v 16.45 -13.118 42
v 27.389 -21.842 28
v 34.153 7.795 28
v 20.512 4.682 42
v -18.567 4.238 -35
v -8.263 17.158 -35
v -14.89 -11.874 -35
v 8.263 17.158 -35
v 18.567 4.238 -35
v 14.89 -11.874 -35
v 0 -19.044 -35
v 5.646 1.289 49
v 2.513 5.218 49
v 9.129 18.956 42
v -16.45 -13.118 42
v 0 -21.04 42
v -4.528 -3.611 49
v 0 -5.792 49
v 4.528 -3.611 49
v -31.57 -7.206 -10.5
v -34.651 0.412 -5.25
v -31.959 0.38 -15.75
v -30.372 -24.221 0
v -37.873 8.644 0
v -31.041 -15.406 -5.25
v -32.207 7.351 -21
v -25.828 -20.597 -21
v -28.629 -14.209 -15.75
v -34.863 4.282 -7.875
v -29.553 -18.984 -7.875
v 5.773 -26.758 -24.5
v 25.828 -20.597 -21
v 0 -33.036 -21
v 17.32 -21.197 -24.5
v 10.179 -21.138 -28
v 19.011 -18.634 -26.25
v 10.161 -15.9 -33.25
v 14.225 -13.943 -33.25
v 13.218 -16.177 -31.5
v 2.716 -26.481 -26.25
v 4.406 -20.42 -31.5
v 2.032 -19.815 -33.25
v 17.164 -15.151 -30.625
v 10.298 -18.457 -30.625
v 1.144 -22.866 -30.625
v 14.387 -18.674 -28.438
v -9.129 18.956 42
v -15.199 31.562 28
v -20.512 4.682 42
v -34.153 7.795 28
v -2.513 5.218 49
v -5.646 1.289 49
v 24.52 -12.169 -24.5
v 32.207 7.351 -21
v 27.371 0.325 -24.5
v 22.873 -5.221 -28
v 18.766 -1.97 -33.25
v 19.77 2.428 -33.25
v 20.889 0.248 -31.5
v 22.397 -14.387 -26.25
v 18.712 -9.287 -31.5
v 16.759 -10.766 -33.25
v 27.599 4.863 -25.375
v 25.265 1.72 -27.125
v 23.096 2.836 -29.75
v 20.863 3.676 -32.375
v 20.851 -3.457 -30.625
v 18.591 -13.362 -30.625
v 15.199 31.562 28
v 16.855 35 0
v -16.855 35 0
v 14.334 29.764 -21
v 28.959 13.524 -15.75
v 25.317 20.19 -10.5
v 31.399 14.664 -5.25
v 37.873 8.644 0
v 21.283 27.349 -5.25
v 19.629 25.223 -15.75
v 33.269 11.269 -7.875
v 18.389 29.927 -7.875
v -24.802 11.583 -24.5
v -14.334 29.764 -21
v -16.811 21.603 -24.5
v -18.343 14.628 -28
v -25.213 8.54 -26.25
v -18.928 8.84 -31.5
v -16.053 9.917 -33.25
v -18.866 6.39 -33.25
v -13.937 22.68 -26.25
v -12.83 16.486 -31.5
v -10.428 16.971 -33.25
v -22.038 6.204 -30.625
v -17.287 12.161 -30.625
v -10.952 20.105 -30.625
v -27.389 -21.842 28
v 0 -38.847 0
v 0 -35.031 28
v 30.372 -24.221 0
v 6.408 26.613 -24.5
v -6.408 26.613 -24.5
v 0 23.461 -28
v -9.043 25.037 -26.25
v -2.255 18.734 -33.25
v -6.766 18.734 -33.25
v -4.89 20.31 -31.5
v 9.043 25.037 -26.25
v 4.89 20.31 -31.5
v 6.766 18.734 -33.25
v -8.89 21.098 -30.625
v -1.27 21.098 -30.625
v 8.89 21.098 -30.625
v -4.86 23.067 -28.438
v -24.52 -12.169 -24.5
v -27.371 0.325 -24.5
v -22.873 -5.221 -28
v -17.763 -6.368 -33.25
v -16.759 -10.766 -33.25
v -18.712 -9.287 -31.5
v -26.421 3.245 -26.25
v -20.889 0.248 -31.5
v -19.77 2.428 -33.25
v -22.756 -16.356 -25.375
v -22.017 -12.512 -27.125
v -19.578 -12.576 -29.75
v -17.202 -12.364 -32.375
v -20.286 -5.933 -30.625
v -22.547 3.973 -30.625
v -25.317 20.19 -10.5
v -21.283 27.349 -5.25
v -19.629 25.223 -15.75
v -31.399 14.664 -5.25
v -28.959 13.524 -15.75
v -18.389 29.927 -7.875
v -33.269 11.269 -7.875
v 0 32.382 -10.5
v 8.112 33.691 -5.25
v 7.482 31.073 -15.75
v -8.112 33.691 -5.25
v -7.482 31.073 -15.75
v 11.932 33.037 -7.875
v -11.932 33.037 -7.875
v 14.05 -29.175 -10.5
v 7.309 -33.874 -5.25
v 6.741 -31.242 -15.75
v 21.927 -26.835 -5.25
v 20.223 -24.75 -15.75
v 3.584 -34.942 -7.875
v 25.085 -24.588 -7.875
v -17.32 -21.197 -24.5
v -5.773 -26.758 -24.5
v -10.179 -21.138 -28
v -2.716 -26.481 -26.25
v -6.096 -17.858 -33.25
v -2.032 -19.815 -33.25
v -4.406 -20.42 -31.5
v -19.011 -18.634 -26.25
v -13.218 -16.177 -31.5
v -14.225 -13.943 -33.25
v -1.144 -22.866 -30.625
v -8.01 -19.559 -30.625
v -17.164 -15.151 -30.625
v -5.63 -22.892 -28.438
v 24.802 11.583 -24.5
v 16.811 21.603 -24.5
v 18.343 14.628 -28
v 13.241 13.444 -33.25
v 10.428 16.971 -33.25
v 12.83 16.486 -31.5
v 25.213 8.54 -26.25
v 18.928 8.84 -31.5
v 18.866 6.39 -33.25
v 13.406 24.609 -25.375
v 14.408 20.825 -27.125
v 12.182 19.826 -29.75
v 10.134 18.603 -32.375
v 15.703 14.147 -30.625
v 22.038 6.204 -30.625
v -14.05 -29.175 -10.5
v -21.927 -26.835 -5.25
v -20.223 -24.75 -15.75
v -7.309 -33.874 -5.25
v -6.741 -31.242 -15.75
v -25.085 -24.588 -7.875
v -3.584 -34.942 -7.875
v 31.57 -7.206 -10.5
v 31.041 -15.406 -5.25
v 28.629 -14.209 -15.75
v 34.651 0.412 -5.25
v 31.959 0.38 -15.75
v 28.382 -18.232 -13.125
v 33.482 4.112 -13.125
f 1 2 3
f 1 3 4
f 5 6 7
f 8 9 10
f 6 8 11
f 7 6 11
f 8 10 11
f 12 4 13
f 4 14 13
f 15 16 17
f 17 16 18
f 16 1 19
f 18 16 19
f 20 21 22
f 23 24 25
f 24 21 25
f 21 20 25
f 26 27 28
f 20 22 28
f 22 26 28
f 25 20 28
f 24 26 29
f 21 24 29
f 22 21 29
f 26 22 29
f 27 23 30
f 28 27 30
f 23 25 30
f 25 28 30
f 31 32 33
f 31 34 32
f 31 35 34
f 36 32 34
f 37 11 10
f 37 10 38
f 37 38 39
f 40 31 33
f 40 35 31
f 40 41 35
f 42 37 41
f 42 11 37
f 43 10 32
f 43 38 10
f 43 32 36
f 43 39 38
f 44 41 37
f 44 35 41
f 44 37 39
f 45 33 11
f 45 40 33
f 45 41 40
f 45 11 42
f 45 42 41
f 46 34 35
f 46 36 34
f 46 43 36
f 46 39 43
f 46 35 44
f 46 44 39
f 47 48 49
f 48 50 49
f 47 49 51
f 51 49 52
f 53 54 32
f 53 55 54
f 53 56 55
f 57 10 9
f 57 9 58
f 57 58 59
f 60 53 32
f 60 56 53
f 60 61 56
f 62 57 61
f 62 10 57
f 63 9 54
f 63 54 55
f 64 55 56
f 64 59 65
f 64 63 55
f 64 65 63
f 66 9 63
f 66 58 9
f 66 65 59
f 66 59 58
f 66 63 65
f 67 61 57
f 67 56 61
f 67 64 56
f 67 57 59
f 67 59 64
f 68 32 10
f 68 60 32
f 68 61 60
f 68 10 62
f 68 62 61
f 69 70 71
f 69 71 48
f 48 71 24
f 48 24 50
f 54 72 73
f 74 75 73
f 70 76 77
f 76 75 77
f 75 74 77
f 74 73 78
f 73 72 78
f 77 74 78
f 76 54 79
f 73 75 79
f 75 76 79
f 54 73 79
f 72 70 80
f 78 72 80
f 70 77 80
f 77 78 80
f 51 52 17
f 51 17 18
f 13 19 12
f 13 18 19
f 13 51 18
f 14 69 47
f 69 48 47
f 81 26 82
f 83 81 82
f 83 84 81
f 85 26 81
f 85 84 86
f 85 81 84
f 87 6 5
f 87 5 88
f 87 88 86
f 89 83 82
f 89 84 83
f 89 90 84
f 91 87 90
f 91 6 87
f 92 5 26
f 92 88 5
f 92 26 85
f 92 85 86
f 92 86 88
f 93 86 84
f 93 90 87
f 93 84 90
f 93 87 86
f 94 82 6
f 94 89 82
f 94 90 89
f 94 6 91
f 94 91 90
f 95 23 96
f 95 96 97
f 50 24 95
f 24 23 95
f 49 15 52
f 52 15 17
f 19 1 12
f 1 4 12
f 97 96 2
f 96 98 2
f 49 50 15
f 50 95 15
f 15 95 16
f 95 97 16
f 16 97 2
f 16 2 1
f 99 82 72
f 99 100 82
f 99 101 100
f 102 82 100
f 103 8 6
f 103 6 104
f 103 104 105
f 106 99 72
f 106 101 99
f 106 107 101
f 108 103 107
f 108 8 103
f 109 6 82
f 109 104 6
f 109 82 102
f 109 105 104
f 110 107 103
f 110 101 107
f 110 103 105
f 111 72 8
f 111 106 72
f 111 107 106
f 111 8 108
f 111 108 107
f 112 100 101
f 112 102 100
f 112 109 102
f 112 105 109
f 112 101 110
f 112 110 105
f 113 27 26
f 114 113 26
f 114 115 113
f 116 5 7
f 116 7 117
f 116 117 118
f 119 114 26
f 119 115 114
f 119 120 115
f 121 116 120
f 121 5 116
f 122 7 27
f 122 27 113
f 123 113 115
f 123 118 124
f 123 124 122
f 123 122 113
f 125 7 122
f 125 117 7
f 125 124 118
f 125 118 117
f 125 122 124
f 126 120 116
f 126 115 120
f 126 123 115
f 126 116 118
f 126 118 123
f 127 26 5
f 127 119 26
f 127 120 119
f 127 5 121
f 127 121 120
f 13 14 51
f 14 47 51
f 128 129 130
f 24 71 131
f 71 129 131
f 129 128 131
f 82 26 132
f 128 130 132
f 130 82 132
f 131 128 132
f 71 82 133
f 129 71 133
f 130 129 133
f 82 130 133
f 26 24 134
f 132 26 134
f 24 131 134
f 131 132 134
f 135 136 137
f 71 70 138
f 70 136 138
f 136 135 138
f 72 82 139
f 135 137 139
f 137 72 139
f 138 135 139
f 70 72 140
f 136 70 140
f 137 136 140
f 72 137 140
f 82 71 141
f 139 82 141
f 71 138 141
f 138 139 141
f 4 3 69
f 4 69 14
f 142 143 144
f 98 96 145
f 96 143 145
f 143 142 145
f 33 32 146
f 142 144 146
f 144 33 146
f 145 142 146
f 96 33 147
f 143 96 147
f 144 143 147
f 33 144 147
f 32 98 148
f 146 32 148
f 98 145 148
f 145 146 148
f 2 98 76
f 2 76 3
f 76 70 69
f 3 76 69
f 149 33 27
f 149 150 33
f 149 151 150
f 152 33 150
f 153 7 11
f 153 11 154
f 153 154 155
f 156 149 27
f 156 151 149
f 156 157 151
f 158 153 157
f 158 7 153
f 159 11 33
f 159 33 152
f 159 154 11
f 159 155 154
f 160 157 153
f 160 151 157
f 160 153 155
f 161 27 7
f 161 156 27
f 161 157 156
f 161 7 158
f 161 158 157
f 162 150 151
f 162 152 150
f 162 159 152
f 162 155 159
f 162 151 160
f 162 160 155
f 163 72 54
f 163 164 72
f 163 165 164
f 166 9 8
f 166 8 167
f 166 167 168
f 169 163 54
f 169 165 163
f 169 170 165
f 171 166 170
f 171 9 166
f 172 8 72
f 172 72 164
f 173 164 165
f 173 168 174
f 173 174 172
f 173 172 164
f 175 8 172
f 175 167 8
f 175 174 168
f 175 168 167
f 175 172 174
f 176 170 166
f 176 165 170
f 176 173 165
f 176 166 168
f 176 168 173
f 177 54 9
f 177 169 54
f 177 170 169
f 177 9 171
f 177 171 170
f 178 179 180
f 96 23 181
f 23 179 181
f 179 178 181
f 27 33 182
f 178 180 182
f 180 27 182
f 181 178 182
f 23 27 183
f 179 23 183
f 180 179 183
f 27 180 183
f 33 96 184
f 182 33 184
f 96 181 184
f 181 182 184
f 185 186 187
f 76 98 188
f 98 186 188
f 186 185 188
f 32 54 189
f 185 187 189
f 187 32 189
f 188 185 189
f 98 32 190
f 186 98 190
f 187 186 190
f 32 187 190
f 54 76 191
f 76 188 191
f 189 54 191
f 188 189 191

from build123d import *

# Parameters (mm, degrees)
F1_DEPTH = 28
F1_TAPER = 7
F2_DEPTH = 14
F2_TAPER = 42
F3_DEPTH = 7
F3_TAPER = 63
F4_DEPTH = 21
F4_TAPER = 14
F5_DEPTH = 14
F5_TAPER = 42


with BuildPart() as f1:
    # F0 (on Top) → F1 (new body)
    with BuildSketch(Plane.XY):
        Polygon((16.8551116583, 35), (-16.8551116583, 35), (-37.8730921145, 8.6442861301), (-30.3718617382, -24.2207515071), (0, -38.8470692461), (30.3718617382, -24.2207515071), (37.8730921145, 8.6442861301), align=None)
    extrude(amount=F1_DEPTH, taper=F1_TAPER)

    # F1_face (on face) → F2 (join)
    with BuildSketch(Plane.XY.offset(28)):
        Polygon((34.1529073262, 7.7951782287), (15.1994736711, 31.5620322947), (-15.1994736711, 31.5620322947), (-34.1529073262, 7.7951782287), (-27.3885051724, -21.8416040362), (0, -35.0312129743), (27.3885051724, -21.8416040362), align=None)
    extrude(amount=F2_DEPTH, taper=F2_TAPER)

    # F2_face (on face) → F3 (join)
    with BuildSketch(Plane.XY.offset(42)):
        Polygon((16.4497263156, -13.1182189911), (20.5124732023, 4.681838152), (9.1289093894, 18.9563756745), (-9.1289093894, 18.9563756745), (-20.5124732023, 4.681838152), (-16.4497263156, -13.1182189911), (0, -21.039989671), align=None)
    extrude(amount=F3_DEPTH, taper=F3_TAPER)

    # F0 (on Top) → F4 (join)
    with BuildSketch(Plane.XY):
        Polygon((16.8551116583, 35), (-16.8551116583, 35), (-37.8730921145, 8.6442861301), (-30.3718617382, -24.2207515071), (0, -38.8470692461), (30.3718617382, -24.2207515071), (37.8730921145, 8.6442861301), align=None)
    extrude(amount=-F4_DEPTH, taper=F4_TAPER)

    # F4_face (on face) → F5 (join)
    with BuildSketch(Plane(origin=(0, 0, -21), x_dir=(1, 0, 0), z_dir=(0, 0, -1))):
        Polygon((14.3336408618, -29.7641119403), (32.2073986635, -7.351128572), (25.8283283603, 20.5974045467), (0, 33.0356719312), (-25.8283283603, 20.5974045467), (-32.2073986635, -7.351128572), (-14.3336408618, -29.7641119403), align=None)
    extrude(amount=F5_DEPTH, taper=F5_TAPER)


solid = f1.part
